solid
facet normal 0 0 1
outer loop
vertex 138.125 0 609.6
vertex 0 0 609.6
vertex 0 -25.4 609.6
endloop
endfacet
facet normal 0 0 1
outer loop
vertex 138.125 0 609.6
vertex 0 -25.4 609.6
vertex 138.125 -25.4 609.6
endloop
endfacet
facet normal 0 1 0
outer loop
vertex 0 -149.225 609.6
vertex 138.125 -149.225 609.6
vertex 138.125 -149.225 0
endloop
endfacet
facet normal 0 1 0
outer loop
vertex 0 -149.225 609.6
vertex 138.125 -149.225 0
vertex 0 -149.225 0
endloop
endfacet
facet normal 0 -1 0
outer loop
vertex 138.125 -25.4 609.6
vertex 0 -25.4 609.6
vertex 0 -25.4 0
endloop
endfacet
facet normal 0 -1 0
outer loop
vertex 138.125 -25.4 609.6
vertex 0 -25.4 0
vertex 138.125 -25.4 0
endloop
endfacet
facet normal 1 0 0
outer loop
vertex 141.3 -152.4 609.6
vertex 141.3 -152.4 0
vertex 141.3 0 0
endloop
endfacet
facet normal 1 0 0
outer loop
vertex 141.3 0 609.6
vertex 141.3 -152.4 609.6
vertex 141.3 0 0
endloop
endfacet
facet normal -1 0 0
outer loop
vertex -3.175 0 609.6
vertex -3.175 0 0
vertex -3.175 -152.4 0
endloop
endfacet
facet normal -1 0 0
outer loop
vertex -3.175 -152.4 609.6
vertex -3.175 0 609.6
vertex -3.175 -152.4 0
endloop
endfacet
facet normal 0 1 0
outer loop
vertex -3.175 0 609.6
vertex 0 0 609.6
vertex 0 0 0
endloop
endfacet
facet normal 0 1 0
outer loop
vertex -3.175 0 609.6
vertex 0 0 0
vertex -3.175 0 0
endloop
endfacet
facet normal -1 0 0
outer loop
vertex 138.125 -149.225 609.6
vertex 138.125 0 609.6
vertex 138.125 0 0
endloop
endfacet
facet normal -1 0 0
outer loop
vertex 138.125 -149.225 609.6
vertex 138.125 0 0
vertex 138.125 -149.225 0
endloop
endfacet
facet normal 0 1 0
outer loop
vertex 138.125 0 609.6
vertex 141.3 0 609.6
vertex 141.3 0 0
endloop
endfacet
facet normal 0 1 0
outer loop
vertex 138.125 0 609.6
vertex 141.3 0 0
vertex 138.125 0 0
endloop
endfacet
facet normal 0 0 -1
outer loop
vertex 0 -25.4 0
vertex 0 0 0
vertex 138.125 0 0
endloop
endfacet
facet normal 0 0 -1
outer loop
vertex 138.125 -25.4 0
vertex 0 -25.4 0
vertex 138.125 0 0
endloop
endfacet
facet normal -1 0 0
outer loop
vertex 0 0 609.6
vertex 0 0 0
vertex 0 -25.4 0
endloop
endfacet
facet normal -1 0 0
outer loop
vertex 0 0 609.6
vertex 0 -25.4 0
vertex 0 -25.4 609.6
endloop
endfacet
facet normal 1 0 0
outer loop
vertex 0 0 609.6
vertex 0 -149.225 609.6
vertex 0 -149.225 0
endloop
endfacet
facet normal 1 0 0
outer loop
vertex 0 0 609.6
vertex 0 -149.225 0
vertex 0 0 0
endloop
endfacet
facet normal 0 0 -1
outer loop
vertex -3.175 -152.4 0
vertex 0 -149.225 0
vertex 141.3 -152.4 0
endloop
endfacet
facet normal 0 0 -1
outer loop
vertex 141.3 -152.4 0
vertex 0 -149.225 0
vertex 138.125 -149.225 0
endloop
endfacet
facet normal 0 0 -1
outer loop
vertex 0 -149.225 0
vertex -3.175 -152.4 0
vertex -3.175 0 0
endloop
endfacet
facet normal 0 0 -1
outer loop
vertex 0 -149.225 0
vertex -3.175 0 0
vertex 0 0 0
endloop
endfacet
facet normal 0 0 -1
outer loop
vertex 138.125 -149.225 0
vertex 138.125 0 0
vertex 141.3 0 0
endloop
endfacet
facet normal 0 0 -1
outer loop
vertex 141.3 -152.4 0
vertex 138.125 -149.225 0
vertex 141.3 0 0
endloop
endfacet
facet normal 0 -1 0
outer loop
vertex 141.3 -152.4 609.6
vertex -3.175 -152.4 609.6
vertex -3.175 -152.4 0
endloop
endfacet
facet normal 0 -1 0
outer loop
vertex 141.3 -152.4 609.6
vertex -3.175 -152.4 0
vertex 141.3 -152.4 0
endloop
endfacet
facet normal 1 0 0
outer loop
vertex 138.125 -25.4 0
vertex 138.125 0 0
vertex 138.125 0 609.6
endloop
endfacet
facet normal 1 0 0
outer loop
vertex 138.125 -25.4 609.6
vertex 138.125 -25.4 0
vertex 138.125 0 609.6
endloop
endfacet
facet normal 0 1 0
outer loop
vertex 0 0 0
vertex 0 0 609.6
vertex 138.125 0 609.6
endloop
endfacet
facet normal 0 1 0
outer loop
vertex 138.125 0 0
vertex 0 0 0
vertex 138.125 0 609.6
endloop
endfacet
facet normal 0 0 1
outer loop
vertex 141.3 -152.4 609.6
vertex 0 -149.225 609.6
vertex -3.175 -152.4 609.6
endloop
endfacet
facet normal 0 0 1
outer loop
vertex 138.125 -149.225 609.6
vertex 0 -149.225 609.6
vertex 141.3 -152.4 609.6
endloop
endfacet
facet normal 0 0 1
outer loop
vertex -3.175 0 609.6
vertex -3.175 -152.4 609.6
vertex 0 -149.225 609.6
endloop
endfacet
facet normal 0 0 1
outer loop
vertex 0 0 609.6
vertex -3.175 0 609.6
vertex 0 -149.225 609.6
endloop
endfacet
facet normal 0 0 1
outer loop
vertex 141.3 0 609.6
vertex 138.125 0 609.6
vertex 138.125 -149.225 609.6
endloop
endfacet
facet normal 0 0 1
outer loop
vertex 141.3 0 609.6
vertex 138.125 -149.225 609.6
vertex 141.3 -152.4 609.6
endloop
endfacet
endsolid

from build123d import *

# Parameters (mm, degrees)
F0_W     = 138.1252
F0_H     = 609.6
F1_DEPTH = 25.4
F3_DEPTH = 609.6


with BuildPart() as f1:
    # F0 (on Front) → F1 (new body)
    with BuildSketch(Plane.XZ):
        with Locations((69.0626, 304.8)):
            Rectangle(F0_W, F0_H)
    extrude(amount=F1_DEPTH)


with BuildPart() as f3:
    # F2 (on face) → F3 (new body)
    with BuildSketch(Plane.XY.offset(609.6)):
        Polygon((0, -149.225), (0, 0), (-3.175, 0), (-3.175, -152.4), (141.3002, -152.4), (141.3002, 0), (138.1252, 0), (138.1252, -149.225), align=None)
    extrude(amount=-F3_DEPTH)


solid = Compound([f1.part, f3.part])
